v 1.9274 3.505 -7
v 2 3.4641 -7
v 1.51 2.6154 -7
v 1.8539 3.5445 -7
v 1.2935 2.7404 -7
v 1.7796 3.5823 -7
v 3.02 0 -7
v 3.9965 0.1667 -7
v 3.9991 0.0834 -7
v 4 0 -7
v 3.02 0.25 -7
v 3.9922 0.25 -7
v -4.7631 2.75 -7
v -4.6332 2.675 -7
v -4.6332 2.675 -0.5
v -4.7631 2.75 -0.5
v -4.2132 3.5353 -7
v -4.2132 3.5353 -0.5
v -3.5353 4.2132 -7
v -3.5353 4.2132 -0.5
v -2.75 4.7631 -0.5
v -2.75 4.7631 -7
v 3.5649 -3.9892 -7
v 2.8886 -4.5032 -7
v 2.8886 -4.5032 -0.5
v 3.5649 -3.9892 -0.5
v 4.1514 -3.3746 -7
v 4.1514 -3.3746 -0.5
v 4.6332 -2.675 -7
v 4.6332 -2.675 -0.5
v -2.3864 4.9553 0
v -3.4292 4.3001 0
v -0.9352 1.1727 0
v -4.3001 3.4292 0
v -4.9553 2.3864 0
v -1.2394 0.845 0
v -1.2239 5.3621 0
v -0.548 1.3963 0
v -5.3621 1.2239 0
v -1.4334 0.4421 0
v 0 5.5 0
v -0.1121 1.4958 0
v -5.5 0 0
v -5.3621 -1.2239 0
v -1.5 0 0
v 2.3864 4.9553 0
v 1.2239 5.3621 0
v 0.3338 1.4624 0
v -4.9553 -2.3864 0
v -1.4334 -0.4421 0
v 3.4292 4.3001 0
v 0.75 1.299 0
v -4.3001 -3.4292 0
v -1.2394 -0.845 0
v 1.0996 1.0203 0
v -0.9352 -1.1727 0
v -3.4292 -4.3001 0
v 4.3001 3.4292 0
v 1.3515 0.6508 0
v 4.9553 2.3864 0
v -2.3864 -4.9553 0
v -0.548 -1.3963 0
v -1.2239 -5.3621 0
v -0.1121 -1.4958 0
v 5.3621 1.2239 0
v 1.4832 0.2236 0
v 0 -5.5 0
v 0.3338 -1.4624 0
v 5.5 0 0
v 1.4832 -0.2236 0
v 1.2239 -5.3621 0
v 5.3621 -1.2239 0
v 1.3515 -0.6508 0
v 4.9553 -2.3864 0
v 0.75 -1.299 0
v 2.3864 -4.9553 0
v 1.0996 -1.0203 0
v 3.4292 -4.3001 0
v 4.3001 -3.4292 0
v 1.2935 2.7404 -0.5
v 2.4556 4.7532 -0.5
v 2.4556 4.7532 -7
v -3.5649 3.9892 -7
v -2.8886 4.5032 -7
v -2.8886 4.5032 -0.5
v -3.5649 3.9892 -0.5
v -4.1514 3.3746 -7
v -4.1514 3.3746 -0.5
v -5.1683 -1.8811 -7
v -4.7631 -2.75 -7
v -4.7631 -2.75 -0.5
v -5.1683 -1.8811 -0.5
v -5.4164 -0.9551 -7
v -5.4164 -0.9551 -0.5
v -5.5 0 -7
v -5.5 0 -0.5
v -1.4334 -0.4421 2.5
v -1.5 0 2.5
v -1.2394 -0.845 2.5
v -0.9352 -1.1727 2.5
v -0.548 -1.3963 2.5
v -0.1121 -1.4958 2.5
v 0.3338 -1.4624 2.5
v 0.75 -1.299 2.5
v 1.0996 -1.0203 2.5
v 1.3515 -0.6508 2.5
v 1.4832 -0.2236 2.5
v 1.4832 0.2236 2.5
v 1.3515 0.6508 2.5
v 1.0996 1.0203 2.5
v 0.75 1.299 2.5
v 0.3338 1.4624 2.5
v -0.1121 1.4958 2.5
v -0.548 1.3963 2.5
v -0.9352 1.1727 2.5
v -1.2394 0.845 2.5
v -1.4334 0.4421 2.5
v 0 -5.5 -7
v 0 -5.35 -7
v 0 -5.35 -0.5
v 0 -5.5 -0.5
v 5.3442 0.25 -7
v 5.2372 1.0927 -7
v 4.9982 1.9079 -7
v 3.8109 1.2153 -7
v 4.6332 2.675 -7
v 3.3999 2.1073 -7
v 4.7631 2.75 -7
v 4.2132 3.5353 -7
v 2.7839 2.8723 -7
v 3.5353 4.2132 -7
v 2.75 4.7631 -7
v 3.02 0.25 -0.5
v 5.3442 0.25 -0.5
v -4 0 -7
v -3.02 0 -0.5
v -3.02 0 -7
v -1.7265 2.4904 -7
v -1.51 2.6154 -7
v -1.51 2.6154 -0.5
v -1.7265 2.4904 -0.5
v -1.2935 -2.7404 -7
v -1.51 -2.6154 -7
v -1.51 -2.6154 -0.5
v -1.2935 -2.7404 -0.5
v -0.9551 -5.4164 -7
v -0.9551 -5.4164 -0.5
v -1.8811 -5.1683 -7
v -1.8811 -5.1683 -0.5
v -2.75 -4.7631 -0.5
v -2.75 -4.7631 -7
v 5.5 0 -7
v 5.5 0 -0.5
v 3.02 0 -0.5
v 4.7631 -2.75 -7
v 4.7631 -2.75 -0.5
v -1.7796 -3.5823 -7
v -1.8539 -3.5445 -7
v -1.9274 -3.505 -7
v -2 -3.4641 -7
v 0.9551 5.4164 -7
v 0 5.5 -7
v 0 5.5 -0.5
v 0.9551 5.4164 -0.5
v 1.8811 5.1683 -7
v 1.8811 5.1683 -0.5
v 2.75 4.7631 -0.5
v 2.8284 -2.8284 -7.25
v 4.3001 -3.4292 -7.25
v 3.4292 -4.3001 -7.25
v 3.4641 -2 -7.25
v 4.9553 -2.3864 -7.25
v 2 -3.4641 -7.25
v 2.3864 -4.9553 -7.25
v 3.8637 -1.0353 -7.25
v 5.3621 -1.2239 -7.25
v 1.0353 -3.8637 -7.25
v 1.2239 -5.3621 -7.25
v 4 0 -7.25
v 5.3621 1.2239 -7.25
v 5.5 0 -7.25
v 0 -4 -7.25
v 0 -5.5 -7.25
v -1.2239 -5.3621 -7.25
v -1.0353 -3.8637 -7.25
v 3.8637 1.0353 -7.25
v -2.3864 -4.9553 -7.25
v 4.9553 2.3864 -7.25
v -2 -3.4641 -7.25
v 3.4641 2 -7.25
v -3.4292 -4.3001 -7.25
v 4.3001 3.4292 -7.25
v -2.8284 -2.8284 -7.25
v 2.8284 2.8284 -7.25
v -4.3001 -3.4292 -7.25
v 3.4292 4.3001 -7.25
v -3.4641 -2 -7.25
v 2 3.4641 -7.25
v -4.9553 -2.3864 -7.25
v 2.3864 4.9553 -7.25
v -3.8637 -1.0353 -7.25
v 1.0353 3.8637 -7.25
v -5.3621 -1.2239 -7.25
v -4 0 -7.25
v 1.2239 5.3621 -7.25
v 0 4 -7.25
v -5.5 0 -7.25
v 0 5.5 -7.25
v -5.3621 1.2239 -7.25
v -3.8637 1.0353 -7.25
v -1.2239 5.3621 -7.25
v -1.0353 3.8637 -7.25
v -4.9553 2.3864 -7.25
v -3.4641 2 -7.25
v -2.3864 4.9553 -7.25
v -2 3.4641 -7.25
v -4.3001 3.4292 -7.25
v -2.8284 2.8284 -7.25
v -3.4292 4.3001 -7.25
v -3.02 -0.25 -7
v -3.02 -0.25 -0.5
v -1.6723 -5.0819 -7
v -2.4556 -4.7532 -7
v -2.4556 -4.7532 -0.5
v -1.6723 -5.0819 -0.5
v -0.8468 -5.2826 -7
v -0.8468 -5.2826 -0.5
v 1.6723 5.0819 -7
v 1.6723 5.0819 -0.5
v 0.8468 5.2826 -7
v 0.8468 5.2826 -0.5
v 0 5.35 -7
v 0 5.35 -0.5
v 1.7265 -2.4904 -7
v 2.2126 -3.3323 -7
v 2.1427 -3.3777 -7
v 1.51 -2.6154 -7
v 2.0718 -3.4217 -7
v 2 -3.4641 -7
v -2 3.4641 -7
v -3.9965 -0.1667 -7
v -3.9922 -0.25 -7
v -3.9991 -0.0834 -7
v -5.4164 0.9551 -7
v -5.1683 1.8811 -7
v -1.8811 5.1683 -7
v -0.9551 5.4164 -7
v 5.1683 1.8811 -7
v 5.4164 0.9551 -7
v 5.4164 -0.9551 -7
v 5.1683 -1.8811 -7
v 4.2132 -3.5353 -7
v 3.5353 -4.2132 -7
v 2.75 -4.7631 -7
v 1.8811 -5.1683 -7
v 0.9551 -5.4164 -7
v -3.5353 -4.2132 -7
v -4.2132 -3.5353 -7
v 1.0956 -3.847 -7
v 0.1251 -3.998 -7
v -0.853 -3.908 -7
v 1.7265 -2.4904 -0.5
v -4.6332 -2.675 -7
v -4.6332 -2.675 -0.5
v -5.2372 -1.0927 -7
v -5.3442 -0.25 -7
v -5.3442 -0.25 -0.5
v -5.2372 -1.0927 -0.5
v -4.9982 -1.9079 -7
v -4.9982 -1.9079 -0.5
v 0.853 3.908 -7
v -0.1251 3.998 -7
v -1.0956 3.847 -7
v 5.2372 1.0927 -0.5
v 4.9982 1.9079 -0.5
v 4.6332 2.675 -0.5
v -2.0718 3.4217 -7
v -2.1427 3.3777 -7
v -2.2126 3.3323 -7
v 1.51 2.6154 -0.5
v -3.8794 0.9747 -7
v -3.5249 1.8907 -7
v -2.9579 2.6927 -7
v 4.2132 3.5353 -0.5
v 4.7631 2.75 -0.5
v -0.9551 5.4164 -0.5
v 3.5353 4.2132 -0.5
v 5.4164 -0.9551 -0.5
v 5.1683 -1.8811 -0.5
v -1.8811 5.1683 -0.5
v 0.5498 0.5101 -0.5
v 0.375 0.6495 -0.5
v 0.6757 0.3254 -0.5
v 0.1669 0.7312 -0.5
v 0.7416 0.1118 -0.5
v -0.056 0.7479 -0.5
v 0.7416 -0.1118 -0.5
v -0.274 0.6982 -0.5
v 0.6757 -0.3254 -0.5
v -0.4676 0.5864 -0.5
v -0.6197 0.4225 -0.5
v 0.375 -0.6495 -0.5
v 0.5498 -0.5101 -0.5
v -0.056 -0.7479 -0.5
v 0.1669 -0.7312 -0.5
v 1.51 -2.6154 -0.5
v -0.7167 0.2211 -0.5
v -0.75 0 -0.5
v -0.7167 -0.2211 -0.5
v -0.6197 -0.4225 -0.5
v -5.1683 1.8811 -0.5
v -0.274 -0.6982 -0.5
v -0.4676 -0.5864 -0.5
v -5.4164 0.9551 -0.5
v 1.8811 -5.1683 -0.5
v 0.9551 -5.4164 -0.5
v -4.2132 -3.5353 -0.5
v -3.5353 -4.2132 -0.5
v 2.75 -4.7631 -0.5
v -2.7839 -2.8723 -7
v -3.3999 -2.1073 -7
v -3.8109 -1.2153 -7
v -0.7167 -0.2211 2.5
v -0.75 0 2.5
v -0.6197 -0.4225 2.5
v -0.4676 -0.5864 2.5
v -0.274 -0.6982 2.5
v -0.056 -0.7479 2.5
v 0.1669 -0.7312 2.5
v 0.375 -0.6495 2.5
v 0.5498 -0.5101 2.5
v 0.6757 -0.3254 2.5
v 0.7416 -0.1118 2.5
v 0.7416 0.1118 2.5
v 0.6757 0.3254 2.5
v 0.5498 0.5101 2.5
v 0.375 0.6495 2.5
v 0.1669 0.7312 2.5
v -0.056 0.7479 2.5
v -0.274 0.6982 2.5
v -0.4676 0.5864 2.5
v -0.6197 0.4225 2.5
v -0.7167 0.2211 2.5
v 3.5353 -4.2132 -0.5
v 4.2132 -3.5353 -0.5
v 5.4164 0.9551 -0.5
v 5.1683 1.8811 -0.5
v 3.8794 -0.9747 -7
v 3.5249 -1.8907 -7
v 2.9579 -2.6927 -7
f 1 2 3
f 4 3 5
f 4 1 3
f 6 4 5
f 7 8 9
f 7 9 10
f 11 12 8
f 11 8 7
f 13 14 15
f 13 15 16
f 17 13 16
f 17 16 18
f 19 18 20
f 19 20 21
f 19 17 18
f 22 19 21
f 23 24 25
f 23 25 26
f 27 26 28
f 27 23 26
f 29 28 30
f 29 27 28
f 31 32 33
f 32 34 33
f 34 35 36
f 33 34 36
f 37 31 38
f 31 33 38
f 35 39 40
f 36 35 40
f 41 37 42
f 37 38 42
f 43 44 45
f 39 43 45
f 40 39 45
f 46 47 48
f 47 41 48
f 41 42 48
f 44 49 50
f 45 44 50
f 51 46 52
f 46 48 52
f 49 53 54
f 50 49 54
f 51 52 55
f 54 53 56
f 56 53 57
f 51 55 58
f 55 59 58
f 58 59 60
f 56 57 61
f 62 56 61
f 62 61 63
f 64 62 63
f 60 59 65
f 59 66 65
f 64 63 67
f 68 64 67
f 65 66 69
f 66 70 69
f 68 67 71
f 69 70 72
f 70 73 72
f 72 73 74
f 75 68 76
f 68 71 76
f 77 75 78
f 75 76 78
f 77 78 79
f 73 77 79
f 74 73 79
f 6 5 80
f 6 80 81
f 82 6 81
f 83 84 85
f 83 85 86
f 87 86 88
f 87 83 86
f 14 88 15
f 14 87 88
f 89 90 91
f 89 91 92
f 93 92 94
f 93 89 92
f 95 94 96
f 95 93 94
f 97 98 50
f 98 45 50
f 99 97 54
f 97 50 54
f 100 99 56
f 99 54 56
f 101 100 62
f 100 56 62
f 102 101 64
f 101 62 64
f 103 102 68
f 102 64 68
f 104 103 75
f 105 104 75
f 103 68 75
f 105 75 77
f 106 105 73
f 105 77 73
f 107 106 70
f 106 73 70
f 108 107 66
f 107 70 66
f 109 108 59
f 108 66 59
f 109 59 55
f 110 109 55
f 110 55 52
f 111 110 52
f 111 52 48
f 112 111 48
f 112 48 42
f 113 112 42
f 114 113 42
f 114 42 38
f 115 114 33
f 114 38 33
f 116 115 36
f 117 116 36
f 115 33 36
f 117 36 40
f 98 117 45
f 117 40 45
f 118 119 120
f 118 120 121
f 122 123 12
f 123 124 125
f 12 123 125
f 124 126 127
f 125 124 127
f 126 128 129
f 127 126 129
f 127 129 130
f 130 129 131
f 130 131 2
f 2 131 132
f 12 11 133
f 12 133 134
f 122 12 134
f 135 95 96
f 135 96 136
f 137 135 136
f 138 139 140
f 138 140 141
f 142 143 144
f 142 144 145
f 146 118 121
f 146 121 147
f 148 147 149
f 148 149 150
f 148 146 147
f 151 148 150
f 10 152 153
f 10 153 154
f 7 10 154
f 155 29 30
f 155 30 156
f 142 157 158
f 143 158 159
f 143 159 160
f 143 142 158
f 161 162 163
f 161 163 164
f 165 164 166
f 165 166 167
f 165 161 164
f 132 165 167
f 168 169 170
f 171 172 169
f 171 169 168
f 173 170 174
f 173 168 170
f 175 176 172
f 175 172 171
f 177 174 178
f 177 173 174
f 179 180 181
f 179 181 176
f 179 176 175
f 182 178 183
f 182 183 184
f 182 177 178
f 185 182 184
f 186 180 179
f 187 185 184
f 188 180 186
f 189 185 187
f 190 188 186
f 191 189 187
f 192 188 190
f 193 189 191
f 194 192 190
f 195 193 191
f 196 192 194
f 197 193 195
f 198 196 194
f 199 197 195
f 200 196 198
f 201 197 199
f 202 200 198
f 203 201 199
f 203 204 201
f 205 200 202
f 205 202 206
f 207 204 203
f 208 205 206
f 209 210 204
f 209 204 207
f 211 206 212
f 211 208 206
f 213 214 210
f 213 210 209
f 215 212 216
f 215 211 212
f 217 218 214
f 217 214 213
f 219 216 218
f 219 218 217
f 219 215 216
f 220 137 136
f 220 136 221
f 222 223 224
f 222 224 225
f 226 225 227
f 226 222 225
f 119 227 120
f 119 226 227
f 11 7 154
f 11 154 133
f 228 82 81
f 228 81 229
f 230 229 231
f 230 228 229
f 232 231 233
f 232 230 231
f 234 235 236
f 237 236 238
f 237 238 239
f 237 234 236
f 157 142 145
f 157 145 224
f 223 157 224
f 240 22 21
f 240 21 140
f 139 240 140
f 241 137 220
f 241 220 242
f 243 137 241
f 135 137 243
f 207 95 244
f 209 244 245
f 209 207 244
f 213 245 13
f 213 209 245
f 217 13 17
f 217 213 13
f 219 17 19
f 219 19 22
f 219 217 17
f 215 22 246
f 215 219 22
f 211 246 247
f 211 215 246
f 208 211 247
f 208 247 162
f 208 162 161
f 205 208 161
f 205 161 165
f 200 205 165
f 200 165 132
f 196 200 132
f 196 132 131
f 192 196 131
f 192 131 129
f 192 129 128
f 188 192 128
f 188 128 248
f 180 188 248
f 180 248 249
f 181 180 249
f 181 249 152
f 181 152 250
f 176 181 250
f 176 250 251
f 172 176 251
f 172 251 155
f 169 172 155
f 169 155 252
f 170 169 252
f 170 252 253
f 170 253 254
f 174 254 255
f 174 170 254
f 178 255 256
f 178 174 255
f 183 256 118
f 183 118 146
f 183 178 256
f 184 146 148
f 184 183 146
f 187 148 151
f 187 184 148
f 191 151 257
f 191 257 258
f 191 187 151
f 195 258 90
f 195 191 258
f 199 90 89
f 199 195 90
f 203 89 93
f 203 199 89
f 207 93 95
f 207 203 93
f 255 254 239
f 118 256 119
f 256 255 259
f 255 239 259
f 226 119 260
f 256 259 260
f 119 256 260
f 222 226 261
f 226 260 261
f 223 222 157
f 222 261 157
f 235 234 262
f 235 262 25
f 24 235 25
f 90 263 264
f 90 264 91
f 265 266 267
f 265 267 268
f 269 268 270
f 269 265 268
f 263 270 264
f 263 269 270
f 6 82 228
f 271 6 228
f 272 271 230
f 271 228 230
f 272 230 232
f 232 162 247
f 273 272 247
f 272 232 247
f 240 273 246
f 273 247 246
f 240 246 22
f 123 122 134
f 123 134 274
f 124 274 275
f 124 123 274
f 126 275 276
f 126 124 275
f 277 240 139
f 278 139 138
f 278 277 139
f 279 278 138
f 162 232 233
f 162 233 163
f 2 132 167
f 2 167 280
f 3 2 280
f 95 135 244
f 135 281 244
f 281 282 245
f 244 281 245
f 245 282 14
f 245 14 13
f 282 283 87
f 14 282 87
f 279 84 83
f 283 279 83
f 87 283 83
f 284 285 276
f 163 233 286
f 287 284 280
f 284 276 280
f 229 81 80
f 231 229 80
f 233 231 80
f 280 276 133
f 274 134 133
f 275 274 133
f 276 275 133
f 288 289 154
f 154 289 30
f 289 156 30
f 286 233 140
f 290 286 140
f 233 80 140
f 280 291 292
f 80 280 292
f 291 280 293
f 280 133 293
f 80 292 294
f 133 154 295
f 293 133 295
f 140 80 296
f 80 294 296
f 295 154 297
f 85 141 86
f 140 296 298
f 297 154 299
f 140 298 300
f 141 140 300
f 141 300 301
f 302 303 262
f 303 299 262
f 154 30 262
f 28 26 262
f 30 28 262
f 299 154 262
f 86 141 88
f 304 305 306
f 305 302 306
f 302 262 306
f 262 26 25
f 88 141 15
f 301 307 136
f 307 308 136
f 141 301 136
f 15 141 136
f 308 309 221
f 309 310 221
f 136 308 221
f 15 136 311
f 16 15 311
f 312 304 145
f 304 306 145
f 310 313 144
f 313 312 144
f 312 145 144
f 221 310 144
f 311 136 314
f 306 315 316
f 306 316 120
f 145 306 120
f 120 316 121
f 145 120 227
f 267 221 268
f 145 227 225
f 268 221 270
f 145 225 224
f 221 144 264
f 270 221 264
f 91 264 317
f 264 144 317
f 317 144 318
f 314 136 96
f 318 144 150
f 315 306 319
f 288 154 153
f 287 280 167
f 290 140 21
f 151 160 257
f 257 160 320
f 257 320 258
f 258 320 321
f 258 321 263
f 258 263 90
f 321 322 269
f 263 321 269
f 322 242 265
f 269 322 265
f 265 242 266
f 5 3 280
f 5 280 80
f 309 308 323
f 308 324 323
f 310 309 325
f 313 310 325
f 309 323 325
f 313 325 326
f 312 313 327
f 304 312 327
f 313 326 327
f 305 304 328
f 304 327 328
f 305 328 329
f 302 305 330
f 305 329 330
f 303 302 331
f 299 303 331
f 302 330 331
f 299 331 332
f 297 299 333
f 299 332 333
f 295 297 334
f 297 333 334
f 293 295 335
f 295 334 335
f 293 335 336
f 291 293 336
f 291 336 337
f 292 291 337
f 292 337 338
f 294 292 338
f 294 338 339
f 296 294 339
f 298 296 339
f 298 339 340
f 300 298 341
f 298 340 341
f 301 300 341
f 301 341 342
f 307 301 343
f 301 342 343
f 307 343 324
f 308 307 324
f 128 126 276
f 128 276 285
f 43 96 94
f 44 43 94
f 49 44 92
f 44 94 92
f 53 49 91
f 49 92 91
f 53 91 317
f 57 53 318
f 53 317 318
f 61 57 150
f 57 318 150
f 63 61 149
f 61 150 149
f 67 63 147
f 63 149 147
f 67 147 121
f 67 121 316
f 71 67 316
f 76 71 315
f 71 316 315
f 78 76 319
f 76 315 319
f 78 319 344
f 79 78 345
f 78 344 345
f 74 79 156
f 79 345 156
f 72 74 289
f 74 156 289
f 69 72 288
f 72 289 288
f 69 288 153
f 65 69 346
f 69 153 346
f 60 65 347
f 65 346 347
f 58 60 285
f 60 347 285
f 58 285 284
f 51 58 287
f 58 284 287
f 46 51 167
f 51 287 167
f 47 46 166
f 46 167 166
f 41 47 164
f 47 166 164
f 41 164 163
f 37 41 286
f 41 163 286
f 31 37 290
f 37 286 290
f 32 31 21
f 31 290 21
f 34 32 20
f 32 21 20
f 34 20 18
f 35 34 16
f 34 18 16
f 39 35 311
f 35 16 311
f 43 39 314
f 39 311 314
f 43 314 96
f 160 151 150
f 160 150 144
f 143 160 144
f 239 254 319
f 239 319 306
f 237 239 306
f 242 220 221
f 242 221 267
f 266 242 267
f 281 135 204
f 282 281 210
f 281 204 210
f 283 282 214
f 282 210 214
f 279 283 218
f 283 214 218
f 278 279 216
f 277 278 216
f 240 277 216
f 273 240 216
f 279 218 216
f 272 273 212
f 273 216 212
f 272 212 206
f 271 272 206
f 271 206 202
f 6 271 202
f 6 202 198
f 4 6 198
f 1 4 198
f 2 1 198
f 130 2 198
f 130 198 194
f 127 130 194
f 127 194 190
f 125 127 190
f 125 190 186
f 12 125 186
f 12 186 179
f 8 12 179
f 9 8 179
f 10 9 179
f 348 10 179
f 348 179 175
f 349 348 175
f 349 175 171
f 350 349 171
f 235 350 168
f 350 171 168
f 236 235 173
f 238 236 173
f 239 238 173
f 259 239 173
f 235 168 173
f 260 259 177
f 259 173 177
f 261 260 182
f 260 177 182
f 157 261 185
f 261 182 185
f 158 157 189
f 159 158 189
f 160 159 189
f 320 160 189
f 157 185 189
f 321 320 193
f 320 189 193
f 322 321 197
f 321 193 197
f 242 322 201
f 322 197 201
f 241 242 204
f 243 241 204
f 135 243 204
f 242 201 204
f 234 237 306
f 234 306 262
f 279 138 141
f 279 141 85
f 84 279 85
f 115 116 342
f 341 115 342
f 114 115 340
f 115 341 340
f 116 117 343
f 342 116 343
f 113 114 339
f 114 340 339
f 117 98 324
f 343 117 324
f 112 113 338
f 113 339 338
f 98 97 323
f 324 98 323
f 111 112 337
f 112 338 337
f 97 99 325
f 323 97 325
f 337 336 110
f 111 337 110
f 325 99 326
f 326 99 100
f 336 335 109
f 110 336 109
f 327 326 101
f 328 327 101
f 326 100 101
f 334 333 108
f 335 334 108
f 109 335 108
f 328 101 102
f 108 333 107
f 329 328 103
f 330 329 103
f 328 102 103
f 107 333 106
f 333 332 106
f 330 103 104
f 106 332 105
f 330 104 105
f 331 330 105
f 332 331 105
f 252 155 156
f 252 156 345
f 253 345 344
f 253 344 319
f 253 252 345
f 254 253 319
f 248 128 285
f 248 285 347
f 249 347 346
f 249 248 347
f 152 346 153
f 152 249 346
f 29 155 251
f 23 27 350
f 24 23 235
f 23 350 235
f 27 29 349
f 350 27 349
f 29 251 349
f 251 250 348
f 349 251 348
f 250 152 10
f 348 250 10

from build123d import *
from build123d.topology import SkipClean

# Parameters (mm, degrees)
BOSS_EXTRUDE1_START = 6.5
BOSS_EXTRUDE1_DEPTH = 6.5
BOSS_EXTRUDE2_START = 0.25
SKETCH3_R           = 5.5
SKETCH3_R_2         = 4
BOSS_EXTRUDE2_DEPTH = 0.25


with BuildPart() as part:
    # Sketch1 → Revolve1 (revolve)
    with BuildSketch(Plane(origin=(0, 0, 0), x_dir=(1, 0, 0), z_dir=(0, 1, 0)), mode=Mode.PRIVATE) as revolve1_sk:
        Polygon((5.5, 0.5), (0.75, 0.5), (0.75, -2.5), (1.5, -2.5), (1.5, 0), (5.5, 0), align=None)
    revolve(revolve1_sk.sketch.rotate(Axis((0, 0, -4.303790718), (0, 0, 1)), 180), axis=Axis((0, 0, -4.303790718), (0, 0, 1)))

    # Sketch2 → Boss-Extrude1 (add)
    with SkipClean():  # the faces are left unmerged after this step: merging them gives an invalid solid
        with BuildSketch(Plane(origin=(0, 0, -0.5), x_dir=(-1, 0, 0), z_dir=(0, 0, -1)).offset(BOSS_EXTRUDE1_START)):
            with BuildLine():
                Line((5.5, 0), (3.02, 0))
                Line((3.02, 0), (3.02, -0.25))
                Line((3.02, -0.25), (5.344155686, -0.25))
                ThreePointArc((5.344155686, -0.25), (5.133930465, -1.505077401), (4.63323591, -2.675))
                Line((4.63323591, -2.675), (4.763139721, -2.75))
                ThreePointArc((4.763139721, -2.75), (5.312592045, -1.423504748), (5.5, 0))
            make_face()
            with BuildLine():
                Line((2.75, -4.763139721), (1.51, -2.615396719))
                Line((1.51, -2.615396719), (1.293493649, -2.740396719))
                Line((1.293493649, -2.740396719), (2.455571492, -4.753174586))
                ThreePointArc((2.455571492, -4.753174586), (1.263529969, -5.198652904), (0, -5.35))
                Line((0, -5.35), (0, -5.5))
                ThreePointArc((0, -5.5), (1.423504748, -5.312592045), (2.75, -4.763139721))
            make_face()
            with BuildLine():
                Line((-2.75, -4.763139721), (-1.51, -2.615396719))
                Line((-1.51, -2.615396719), (-1.726506351, -2.490396719))
                Line((-1.726506351, -2.490396719), (-2.888584194, -4.503174586))
                ThreePointArc((-2.888584194, -4.503174586), (-3.870400496, -3.693575503), (-4.63323591, -2.675))
                Line((-4.63323591, -2.675), (-4.763139721, -2.75))
                ThreePointArc((-4.763139721, -2.75), (-3.889087297, -3.889087297), (-2.75, -4.763139721))
            make_face()
            with BuildLine():
                Line((-5.5, 0), (-3.02, 0))
                Line((-3.02, 0), (-3.02, 0.25))
                Line((-3.02, 0.25), (-5.344155686, 0.25))
                ThreePointArc((-5.344155686, 0.25), (-5.133930465, 1.505077401), (-4.63323591, 2.675))
                Line((-4.63323591, 2.675), (-4.763139721, 2.75))
                ThreePointArc((-4.763139721, 2.75), (-5.312592045, 1.423504748), (-5.5, 0))
            make_face()
            with BuildLine():
                Line((-2.75, 4.763139721), (-1.51, 2.615396719))
                Line((-1.51, 2.615396719), (-1.293493649, 2.740396719))
                Line((-1.293493649, 2.740396719), (-2.455571492, 4.753174586))
                ThreePointArc((-2.455571492, 4.753174586), (-1.263529969, 5.198652904), (0, 5.35))
                Line((0, 5.35), (0, 5.5))
                ThreePointArc((0, 5.5), (-1.423504748, 5.312592045), (-2.75, 4.763139721))
            make_face()
            with BuildLine():
                Line((2.75, 4.763139721), (1.51, 2.615396719))
                Line((1.51, 2.615396719), (1.726506351, 2.490396719))
                Line((1.726506351, 2.490396719), (2.888584194, 4.503174586))
                ThreePointArc((2.888584194, 4.503174586), (3.870400496, 3.693575503), (4.63323591, 2.675))
                Line((4.63323591, 2.675), (4.763139721, 2.75))
                ThreePointArc((4.763139721, 2.75), (3.889087297, 3.889087297), (2.75, 4.763139721))
            make_face()
        extrude(amount=-BOSS_EXTRUDE1_DEPTH)

    # Sketch3 → Boss-Extrude2 (add)
    with SkipClean():  # the faces are left unmerged after this step: merging them gives an invalid solid
        with BuildSketch(Plane(origin=(0, 0, -7), x_dir=(-1, 0, 0), z_dir=(0, 0, -1)).offset(BOSS_EXTRUDE2_START)):
            Circle(SKETCH3_R)
            Circle(SKETCH3_R_2, mode=Mode.SUBTRACT)
        extrude(amount=-BOSS_EXTRUDE2_DEPTH)


solid = part.part
